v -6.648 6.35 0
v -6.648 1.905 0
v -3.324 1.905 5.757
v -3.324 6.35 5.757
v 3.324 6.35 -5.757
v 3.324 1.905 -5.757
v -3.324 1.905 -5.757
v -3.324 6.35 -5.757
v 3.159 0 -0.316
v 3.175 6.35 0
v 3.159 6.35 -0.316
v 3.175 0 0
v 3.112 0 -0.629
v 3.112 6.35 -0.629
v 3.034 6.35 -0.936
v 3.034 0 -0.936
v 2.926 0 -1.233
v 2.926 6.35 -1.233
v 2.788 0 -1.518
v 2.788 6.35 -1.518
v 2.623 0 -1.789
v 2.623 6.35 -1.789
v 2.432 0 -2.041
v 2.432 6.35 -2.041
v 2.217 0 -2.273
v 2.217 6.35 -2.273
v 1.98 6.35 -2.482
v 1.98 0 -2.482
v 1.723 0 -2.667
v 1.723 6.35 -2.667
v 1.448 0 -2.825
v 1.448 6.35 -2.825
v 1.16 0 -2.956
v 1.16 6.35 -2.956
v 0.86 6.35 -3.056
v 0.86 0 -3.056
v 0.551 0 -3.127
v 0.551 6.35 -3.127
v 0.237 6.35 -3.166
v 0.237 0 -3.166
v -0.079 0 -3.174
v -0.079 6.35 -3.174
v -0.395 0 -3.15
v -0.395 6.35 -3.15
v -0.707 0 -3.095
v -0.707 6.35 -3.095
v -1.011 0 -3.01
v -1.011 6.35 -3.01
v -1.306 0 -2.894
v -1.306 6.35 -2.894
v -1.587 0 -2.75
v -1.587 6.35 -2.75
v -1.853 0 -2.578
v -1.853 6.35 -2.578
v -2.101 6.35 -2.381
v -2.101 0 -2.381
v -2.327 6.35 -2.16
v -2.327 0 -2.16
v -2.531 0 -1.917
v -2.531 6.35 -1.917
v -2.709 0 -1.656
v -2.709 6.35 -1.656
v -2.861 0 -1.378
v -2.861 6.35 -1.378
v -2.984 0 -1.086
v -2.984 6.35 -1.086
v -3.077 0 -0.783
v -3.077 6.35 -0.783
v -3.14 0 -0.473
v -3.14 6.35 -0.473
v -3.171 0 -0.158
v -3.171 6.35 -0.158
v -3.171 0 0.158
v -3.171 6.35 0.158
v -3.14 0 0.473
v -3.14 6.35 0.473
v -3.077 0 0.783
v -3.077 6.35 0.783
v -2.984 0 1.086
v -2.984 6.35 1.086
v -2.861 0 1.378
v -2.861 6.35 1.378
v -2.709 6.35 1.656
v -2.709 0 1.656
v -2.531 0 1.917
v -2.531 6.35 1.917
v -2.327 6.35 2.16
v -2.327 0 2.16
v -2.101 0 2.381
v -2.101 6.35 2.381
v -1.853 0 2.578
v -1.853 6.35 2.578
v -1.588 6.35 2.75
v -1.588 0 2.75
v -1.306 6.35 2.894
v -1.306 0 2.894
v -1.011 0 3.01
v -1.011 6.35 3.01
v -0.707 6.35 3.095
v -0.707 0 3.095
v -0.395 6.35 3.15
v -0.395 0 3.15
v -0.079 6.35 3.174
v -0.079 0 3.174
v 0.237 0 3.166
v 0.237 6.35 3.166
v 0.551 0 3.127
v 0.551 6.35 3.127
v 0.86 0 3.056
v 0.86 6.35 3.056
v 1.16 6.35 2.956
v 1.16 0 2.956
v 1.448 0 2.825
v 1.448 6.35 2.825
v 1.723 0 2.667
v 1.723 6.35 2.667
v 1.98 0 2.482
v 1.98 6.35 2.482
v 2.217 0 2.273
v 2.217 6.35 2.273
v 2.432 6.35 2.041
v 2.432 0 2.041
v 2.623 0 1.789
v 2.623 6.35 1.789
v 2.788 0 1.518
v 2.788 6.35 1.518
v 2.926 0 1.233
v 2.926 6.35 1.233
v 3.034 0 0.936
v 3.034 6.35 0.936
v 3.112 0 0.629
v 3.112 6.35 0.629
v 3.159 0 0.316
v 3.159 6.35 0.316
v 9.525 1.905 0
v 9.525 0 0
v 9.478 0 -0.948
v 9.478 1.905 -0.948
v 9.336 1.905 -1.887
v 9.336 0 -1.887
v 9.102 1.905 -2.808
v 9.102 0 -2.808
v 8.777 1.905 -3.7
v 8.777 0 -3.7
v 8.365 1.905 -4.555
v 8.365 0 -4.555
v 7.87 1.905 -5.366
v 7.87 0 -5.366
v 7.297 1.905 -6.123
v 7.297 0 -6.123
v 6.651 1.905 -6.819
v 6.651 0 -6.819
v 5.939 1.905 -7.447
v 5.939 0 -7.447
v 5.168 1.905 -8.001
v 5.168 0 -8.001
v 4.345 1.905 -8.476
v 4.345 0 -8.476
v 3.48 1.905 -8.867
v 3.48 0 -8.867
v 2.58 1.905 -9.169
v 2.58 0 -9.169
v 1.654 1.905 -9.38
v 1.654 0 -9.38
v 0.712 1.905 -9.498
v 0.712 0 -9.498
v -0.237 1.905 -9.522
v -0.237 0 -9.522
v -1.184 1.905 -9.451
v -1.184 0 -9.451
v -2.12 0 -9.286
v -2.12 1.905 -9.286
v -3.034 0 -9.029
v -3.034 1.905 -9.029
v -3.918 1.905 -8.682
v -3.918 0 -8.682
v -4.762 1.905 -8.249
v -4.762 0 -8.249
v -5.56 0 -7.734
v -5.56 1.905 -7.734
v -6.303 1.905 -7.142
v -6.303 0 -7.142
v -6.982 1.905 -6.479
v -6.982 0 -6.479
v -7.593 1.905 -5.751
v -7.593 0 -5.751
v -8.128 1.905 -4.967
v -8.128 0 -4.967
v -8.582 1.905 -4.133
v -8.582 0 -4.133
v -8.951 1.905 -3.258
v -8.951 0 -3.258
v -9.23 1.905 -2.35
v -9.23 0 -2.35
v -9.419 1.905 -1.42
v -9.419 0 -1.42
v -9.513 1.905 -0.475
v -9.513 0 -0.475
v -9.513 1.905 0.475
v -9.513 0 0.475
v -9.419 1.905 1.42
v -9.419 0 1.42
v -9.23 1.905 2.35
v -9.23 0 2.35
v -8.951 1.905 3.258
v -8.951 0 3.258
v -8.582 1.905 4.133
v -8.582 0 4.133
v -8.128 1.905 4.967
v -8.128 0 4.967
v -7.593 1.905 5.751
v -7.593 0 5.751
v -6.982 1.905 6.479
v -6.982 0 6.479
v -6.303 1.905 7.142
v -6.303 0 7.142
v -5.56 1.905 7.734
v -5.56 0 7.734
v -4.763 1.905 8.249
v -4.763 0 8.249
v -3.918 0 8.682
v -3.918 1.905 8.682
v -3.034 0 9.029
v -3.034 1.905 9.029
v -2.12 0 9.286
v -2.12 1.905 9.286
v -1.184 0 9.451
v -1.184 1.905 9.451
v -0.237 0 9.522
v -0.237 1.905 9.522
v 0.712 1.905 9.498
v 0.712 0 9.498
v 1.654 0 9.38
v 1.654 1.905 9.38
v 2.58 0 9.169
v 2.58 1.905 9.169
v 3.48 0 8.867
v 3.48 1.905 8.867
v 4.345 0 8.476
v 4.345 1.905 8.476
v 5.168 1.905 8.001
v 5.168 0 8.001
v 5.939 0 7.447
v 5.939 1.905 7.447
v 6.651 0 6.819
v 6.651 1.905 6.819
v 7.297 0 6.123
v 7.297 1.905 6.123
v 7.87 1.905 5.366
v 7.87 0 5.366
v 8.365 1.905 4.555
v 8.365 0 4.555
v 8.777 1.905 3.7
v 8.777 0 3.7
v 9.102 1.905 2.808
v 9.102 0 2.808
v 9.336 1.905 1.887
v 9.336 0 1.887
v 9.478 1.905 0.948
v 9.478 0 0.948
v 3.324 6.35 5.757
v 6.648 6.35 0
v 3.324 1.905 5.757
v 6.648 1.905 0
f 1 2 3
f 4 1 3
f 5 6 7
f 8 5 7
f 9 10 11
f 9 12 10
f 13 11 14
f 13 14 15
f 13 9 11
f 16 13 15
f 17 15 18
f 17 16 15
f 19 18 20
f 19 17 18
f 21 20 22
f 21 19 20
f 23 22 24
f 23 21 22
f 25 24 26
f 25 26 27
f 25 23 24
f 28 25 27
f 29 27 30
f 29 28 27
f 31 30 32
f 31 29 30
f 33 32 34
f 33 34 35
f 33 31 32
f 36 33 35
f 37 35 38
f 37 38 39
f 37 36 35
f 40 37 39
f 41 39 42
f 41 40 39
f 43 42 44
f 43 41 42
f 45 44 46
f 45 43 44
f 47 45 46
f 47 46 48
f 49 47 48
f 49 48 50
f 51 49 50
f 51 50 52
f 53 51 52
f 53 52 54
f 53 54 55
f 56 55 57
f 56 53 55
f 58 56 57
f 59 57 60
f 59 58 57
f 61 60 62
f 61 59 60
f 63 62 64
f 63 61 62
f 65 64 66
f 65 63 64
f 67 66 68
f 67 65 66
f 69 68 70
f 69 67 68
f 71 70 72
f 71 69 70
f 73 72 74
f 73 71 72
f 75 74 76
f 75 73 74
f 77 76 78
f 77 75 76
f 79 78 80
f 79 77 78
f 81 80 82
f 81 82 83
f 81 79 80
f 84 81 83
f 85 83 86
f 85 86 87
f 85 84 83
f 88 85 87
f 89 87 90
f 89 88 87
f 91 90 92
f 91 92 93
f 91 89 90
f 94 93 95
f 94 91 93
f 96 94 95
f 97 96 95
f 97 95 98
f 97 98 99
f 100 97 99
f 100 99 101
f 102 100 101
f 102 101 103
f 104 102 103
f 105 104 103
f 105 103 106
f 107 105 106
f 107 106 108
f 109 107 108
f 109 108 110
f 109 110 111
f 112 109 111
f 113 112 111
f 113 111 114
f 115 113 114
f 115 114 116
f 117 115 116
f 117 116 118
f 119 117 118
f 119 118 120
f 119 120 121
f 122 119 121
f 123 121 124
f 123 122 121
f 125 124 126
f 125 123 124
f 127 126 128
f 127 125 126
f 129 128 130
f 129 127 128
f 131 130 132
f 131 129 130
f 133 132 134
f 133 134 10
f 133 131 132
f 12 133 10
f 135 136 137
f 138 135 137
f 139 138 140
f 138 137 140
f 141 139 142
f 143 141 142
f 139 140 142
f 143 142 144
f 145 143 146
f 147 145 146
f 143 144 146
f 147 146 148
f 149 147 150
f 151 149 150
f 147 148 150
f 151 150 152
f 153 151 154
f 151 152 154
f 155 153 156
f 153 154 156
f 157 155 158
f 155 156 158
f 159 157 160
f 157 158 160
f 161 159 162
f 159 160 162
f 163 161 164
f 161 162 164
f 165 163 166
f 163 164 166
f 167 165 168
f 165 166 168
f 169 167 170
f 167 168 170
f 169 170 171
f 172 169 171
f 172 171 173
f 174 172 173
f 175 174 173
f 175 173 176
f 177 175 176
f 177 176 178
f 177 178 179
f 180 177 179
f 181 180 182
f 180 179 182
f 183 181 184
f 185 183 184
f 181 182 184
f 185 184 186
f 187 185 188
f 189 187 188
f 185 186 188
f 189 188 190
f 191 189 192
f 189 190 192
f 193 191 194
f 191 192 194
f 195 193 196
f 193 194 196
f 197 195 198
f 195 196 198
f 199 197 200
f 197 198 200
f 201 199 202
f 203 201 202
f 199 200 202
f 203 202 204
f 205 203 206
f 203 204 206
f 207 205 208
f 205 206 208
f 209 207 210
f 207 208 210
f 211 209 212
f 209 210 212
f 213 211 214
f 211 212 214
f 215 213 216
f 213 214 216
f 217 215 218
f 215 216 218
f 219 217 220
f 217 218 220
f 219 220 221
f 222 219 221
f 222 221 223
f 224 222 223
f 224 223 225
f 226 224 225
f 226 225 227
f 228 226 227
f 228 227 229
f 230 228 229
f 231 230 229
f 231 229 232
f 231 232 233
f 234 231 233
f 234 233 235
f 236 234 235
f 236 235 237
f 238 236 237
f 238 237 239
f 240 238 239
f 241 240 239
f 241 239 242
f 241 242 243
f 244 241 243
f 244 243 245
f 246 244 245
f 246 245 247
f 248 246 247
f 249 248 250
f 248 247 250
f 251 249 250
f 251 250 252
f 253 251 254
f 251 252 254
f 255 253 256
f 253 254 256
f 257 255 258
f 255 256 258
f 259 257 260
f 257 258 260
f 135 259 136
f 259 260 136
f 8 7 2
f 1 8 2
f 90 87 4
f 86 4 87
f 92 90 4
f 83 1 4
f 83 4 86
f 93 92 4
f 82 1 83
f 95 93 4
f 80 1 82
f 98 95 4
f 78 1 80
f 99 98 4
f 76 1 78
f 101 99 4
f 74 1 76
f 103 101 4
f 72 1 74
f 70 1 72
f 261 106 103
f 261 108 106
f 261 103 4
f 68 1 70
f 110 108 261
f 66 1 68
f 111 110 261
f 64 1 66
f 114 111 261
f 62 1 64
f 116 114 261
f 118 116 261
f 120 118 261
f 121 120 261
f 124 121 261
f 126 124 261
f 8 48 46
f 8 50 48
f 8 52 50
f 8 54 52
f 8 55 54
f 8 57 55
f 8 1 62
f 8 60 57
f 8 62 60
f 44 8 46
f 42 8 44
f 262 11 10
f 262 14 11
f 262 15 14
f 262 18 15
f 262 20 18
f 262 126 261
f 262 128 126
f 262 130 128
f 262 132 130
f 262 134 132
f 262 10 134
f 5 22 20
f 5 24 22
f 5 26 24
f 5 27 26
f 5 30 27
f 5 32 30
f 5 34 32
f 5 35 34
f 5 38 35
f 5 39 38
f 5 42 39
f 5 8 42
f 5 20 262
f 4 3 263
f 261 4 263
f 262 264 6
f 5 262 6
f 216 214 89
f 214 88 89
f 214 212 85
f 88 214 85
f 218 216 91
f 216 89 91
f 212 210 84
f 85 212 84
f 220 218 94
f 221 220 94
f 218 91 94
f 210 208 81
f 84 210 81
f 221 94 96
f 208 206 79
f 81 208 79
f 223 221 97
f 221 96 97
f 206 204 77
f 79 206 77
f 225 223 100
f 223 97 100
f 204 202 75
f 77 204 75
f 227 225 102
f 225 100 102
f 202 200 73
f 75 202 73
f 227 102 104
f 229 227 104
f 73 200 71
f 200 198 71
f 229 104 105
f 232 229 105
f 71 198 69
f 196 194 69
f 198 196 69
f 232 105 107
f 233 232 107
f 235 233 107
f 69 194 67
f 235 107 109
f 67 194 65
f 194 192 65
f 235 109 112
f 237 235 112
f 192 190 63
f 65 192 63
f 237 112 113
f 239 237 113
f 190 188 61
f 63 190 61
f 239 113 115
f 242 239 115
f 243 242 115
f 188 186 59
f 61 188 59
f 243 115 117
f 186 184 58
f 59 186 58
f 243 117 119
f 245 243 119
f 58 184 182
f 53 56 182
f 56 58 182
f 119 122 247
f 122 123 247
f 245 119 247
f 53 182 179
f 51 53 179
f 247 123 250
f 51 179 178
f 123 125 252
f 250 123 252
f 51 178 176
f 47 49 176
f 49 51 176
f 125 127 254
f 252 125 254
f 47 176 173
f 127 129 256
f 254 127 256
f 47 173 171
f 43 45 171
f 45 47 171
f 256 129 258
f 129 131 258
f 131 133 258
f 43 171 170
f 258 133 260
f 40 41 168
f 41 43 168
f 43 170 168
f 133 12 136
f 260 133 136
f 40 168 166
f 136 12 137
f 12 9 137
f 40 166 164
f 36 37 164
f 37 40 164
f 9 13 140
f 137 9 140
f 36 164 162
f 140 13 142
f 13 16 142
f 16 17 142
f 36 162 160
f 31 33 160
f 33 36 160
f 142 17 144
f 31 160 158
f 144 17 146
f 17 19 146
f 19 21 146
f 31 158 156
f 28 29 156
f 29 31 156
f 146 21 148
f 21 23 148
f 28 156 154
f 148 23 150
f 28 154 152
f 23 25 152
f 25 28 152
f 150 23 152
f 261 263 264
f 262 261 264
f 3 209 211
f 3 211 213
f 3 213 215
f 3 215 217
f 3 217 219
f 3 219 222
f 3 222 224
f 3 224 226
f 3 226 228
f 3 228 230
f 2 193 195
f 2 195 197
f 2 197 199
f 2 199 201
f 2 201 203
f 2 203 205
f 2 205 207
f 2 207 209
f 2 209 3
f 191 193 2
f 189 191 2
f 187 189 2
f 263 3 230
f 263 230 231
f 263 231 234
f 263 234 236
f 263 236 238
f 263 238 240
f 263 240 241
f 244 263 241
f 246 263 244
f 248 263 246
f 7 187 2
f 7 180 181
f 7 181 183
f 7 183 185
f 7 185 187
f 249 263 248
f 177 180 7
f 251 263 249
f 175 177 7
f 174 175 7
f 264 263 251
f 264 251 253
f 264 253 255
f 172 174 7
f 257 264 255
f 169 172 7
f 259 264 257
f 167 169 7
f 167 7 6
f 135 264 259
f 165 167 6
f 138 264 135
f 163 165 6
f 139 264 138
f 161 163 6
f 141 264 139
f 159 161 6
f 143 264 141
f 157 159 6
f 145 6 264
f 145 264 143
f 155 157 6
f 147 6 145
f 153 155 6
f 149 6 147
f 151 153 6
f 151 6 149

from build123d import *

# Parameters (mm, degrees)
SKETCH3_R           = 9.525
SKETCH3_R_2         = 3.175
BOSS_EXTRUDE1_DEPTH = 1.905
SKETCH4_R           = 3.175
BOSS_EXTRUDE2_DEPTH = 4.445


with BuildPart() as part:
    # Sketch3 → Boss-Extrude1 (new body)
    with BuildSketch(Plane(origin=(0, 0, 0), x_dir=(1, 0, 0), z_dir=(0, 1, 0))):
        Circle(SKETCH3_R)
        Circle(SKETCH3_R_2, mode=Mode.SUBTRACT)
    extrude(amount=BOSS_EXTRUDE1_DEPTH)

    # Sketch4 → Boss-Extrude2 (add)
    with BuildSketch(Plane(origin=(0, 1.905, 0), x_dir=(1, 0, 0), z_dir=(0, 1, 0))):
        Polygon((6.647647659, 0), (3.323823829, 5.757031748), (-3.323823829, 5.757031748), (-6.647647659, 0), (-3.323823829, -5.757031748), (3.323823829, -5.757031748), align=None)
        Circle(SKETCH4_R, mode=Mode.SUBTRACT)
    extrude(amount=BOSS_EXTRUDE2_DEPTH)


solid = part.part
